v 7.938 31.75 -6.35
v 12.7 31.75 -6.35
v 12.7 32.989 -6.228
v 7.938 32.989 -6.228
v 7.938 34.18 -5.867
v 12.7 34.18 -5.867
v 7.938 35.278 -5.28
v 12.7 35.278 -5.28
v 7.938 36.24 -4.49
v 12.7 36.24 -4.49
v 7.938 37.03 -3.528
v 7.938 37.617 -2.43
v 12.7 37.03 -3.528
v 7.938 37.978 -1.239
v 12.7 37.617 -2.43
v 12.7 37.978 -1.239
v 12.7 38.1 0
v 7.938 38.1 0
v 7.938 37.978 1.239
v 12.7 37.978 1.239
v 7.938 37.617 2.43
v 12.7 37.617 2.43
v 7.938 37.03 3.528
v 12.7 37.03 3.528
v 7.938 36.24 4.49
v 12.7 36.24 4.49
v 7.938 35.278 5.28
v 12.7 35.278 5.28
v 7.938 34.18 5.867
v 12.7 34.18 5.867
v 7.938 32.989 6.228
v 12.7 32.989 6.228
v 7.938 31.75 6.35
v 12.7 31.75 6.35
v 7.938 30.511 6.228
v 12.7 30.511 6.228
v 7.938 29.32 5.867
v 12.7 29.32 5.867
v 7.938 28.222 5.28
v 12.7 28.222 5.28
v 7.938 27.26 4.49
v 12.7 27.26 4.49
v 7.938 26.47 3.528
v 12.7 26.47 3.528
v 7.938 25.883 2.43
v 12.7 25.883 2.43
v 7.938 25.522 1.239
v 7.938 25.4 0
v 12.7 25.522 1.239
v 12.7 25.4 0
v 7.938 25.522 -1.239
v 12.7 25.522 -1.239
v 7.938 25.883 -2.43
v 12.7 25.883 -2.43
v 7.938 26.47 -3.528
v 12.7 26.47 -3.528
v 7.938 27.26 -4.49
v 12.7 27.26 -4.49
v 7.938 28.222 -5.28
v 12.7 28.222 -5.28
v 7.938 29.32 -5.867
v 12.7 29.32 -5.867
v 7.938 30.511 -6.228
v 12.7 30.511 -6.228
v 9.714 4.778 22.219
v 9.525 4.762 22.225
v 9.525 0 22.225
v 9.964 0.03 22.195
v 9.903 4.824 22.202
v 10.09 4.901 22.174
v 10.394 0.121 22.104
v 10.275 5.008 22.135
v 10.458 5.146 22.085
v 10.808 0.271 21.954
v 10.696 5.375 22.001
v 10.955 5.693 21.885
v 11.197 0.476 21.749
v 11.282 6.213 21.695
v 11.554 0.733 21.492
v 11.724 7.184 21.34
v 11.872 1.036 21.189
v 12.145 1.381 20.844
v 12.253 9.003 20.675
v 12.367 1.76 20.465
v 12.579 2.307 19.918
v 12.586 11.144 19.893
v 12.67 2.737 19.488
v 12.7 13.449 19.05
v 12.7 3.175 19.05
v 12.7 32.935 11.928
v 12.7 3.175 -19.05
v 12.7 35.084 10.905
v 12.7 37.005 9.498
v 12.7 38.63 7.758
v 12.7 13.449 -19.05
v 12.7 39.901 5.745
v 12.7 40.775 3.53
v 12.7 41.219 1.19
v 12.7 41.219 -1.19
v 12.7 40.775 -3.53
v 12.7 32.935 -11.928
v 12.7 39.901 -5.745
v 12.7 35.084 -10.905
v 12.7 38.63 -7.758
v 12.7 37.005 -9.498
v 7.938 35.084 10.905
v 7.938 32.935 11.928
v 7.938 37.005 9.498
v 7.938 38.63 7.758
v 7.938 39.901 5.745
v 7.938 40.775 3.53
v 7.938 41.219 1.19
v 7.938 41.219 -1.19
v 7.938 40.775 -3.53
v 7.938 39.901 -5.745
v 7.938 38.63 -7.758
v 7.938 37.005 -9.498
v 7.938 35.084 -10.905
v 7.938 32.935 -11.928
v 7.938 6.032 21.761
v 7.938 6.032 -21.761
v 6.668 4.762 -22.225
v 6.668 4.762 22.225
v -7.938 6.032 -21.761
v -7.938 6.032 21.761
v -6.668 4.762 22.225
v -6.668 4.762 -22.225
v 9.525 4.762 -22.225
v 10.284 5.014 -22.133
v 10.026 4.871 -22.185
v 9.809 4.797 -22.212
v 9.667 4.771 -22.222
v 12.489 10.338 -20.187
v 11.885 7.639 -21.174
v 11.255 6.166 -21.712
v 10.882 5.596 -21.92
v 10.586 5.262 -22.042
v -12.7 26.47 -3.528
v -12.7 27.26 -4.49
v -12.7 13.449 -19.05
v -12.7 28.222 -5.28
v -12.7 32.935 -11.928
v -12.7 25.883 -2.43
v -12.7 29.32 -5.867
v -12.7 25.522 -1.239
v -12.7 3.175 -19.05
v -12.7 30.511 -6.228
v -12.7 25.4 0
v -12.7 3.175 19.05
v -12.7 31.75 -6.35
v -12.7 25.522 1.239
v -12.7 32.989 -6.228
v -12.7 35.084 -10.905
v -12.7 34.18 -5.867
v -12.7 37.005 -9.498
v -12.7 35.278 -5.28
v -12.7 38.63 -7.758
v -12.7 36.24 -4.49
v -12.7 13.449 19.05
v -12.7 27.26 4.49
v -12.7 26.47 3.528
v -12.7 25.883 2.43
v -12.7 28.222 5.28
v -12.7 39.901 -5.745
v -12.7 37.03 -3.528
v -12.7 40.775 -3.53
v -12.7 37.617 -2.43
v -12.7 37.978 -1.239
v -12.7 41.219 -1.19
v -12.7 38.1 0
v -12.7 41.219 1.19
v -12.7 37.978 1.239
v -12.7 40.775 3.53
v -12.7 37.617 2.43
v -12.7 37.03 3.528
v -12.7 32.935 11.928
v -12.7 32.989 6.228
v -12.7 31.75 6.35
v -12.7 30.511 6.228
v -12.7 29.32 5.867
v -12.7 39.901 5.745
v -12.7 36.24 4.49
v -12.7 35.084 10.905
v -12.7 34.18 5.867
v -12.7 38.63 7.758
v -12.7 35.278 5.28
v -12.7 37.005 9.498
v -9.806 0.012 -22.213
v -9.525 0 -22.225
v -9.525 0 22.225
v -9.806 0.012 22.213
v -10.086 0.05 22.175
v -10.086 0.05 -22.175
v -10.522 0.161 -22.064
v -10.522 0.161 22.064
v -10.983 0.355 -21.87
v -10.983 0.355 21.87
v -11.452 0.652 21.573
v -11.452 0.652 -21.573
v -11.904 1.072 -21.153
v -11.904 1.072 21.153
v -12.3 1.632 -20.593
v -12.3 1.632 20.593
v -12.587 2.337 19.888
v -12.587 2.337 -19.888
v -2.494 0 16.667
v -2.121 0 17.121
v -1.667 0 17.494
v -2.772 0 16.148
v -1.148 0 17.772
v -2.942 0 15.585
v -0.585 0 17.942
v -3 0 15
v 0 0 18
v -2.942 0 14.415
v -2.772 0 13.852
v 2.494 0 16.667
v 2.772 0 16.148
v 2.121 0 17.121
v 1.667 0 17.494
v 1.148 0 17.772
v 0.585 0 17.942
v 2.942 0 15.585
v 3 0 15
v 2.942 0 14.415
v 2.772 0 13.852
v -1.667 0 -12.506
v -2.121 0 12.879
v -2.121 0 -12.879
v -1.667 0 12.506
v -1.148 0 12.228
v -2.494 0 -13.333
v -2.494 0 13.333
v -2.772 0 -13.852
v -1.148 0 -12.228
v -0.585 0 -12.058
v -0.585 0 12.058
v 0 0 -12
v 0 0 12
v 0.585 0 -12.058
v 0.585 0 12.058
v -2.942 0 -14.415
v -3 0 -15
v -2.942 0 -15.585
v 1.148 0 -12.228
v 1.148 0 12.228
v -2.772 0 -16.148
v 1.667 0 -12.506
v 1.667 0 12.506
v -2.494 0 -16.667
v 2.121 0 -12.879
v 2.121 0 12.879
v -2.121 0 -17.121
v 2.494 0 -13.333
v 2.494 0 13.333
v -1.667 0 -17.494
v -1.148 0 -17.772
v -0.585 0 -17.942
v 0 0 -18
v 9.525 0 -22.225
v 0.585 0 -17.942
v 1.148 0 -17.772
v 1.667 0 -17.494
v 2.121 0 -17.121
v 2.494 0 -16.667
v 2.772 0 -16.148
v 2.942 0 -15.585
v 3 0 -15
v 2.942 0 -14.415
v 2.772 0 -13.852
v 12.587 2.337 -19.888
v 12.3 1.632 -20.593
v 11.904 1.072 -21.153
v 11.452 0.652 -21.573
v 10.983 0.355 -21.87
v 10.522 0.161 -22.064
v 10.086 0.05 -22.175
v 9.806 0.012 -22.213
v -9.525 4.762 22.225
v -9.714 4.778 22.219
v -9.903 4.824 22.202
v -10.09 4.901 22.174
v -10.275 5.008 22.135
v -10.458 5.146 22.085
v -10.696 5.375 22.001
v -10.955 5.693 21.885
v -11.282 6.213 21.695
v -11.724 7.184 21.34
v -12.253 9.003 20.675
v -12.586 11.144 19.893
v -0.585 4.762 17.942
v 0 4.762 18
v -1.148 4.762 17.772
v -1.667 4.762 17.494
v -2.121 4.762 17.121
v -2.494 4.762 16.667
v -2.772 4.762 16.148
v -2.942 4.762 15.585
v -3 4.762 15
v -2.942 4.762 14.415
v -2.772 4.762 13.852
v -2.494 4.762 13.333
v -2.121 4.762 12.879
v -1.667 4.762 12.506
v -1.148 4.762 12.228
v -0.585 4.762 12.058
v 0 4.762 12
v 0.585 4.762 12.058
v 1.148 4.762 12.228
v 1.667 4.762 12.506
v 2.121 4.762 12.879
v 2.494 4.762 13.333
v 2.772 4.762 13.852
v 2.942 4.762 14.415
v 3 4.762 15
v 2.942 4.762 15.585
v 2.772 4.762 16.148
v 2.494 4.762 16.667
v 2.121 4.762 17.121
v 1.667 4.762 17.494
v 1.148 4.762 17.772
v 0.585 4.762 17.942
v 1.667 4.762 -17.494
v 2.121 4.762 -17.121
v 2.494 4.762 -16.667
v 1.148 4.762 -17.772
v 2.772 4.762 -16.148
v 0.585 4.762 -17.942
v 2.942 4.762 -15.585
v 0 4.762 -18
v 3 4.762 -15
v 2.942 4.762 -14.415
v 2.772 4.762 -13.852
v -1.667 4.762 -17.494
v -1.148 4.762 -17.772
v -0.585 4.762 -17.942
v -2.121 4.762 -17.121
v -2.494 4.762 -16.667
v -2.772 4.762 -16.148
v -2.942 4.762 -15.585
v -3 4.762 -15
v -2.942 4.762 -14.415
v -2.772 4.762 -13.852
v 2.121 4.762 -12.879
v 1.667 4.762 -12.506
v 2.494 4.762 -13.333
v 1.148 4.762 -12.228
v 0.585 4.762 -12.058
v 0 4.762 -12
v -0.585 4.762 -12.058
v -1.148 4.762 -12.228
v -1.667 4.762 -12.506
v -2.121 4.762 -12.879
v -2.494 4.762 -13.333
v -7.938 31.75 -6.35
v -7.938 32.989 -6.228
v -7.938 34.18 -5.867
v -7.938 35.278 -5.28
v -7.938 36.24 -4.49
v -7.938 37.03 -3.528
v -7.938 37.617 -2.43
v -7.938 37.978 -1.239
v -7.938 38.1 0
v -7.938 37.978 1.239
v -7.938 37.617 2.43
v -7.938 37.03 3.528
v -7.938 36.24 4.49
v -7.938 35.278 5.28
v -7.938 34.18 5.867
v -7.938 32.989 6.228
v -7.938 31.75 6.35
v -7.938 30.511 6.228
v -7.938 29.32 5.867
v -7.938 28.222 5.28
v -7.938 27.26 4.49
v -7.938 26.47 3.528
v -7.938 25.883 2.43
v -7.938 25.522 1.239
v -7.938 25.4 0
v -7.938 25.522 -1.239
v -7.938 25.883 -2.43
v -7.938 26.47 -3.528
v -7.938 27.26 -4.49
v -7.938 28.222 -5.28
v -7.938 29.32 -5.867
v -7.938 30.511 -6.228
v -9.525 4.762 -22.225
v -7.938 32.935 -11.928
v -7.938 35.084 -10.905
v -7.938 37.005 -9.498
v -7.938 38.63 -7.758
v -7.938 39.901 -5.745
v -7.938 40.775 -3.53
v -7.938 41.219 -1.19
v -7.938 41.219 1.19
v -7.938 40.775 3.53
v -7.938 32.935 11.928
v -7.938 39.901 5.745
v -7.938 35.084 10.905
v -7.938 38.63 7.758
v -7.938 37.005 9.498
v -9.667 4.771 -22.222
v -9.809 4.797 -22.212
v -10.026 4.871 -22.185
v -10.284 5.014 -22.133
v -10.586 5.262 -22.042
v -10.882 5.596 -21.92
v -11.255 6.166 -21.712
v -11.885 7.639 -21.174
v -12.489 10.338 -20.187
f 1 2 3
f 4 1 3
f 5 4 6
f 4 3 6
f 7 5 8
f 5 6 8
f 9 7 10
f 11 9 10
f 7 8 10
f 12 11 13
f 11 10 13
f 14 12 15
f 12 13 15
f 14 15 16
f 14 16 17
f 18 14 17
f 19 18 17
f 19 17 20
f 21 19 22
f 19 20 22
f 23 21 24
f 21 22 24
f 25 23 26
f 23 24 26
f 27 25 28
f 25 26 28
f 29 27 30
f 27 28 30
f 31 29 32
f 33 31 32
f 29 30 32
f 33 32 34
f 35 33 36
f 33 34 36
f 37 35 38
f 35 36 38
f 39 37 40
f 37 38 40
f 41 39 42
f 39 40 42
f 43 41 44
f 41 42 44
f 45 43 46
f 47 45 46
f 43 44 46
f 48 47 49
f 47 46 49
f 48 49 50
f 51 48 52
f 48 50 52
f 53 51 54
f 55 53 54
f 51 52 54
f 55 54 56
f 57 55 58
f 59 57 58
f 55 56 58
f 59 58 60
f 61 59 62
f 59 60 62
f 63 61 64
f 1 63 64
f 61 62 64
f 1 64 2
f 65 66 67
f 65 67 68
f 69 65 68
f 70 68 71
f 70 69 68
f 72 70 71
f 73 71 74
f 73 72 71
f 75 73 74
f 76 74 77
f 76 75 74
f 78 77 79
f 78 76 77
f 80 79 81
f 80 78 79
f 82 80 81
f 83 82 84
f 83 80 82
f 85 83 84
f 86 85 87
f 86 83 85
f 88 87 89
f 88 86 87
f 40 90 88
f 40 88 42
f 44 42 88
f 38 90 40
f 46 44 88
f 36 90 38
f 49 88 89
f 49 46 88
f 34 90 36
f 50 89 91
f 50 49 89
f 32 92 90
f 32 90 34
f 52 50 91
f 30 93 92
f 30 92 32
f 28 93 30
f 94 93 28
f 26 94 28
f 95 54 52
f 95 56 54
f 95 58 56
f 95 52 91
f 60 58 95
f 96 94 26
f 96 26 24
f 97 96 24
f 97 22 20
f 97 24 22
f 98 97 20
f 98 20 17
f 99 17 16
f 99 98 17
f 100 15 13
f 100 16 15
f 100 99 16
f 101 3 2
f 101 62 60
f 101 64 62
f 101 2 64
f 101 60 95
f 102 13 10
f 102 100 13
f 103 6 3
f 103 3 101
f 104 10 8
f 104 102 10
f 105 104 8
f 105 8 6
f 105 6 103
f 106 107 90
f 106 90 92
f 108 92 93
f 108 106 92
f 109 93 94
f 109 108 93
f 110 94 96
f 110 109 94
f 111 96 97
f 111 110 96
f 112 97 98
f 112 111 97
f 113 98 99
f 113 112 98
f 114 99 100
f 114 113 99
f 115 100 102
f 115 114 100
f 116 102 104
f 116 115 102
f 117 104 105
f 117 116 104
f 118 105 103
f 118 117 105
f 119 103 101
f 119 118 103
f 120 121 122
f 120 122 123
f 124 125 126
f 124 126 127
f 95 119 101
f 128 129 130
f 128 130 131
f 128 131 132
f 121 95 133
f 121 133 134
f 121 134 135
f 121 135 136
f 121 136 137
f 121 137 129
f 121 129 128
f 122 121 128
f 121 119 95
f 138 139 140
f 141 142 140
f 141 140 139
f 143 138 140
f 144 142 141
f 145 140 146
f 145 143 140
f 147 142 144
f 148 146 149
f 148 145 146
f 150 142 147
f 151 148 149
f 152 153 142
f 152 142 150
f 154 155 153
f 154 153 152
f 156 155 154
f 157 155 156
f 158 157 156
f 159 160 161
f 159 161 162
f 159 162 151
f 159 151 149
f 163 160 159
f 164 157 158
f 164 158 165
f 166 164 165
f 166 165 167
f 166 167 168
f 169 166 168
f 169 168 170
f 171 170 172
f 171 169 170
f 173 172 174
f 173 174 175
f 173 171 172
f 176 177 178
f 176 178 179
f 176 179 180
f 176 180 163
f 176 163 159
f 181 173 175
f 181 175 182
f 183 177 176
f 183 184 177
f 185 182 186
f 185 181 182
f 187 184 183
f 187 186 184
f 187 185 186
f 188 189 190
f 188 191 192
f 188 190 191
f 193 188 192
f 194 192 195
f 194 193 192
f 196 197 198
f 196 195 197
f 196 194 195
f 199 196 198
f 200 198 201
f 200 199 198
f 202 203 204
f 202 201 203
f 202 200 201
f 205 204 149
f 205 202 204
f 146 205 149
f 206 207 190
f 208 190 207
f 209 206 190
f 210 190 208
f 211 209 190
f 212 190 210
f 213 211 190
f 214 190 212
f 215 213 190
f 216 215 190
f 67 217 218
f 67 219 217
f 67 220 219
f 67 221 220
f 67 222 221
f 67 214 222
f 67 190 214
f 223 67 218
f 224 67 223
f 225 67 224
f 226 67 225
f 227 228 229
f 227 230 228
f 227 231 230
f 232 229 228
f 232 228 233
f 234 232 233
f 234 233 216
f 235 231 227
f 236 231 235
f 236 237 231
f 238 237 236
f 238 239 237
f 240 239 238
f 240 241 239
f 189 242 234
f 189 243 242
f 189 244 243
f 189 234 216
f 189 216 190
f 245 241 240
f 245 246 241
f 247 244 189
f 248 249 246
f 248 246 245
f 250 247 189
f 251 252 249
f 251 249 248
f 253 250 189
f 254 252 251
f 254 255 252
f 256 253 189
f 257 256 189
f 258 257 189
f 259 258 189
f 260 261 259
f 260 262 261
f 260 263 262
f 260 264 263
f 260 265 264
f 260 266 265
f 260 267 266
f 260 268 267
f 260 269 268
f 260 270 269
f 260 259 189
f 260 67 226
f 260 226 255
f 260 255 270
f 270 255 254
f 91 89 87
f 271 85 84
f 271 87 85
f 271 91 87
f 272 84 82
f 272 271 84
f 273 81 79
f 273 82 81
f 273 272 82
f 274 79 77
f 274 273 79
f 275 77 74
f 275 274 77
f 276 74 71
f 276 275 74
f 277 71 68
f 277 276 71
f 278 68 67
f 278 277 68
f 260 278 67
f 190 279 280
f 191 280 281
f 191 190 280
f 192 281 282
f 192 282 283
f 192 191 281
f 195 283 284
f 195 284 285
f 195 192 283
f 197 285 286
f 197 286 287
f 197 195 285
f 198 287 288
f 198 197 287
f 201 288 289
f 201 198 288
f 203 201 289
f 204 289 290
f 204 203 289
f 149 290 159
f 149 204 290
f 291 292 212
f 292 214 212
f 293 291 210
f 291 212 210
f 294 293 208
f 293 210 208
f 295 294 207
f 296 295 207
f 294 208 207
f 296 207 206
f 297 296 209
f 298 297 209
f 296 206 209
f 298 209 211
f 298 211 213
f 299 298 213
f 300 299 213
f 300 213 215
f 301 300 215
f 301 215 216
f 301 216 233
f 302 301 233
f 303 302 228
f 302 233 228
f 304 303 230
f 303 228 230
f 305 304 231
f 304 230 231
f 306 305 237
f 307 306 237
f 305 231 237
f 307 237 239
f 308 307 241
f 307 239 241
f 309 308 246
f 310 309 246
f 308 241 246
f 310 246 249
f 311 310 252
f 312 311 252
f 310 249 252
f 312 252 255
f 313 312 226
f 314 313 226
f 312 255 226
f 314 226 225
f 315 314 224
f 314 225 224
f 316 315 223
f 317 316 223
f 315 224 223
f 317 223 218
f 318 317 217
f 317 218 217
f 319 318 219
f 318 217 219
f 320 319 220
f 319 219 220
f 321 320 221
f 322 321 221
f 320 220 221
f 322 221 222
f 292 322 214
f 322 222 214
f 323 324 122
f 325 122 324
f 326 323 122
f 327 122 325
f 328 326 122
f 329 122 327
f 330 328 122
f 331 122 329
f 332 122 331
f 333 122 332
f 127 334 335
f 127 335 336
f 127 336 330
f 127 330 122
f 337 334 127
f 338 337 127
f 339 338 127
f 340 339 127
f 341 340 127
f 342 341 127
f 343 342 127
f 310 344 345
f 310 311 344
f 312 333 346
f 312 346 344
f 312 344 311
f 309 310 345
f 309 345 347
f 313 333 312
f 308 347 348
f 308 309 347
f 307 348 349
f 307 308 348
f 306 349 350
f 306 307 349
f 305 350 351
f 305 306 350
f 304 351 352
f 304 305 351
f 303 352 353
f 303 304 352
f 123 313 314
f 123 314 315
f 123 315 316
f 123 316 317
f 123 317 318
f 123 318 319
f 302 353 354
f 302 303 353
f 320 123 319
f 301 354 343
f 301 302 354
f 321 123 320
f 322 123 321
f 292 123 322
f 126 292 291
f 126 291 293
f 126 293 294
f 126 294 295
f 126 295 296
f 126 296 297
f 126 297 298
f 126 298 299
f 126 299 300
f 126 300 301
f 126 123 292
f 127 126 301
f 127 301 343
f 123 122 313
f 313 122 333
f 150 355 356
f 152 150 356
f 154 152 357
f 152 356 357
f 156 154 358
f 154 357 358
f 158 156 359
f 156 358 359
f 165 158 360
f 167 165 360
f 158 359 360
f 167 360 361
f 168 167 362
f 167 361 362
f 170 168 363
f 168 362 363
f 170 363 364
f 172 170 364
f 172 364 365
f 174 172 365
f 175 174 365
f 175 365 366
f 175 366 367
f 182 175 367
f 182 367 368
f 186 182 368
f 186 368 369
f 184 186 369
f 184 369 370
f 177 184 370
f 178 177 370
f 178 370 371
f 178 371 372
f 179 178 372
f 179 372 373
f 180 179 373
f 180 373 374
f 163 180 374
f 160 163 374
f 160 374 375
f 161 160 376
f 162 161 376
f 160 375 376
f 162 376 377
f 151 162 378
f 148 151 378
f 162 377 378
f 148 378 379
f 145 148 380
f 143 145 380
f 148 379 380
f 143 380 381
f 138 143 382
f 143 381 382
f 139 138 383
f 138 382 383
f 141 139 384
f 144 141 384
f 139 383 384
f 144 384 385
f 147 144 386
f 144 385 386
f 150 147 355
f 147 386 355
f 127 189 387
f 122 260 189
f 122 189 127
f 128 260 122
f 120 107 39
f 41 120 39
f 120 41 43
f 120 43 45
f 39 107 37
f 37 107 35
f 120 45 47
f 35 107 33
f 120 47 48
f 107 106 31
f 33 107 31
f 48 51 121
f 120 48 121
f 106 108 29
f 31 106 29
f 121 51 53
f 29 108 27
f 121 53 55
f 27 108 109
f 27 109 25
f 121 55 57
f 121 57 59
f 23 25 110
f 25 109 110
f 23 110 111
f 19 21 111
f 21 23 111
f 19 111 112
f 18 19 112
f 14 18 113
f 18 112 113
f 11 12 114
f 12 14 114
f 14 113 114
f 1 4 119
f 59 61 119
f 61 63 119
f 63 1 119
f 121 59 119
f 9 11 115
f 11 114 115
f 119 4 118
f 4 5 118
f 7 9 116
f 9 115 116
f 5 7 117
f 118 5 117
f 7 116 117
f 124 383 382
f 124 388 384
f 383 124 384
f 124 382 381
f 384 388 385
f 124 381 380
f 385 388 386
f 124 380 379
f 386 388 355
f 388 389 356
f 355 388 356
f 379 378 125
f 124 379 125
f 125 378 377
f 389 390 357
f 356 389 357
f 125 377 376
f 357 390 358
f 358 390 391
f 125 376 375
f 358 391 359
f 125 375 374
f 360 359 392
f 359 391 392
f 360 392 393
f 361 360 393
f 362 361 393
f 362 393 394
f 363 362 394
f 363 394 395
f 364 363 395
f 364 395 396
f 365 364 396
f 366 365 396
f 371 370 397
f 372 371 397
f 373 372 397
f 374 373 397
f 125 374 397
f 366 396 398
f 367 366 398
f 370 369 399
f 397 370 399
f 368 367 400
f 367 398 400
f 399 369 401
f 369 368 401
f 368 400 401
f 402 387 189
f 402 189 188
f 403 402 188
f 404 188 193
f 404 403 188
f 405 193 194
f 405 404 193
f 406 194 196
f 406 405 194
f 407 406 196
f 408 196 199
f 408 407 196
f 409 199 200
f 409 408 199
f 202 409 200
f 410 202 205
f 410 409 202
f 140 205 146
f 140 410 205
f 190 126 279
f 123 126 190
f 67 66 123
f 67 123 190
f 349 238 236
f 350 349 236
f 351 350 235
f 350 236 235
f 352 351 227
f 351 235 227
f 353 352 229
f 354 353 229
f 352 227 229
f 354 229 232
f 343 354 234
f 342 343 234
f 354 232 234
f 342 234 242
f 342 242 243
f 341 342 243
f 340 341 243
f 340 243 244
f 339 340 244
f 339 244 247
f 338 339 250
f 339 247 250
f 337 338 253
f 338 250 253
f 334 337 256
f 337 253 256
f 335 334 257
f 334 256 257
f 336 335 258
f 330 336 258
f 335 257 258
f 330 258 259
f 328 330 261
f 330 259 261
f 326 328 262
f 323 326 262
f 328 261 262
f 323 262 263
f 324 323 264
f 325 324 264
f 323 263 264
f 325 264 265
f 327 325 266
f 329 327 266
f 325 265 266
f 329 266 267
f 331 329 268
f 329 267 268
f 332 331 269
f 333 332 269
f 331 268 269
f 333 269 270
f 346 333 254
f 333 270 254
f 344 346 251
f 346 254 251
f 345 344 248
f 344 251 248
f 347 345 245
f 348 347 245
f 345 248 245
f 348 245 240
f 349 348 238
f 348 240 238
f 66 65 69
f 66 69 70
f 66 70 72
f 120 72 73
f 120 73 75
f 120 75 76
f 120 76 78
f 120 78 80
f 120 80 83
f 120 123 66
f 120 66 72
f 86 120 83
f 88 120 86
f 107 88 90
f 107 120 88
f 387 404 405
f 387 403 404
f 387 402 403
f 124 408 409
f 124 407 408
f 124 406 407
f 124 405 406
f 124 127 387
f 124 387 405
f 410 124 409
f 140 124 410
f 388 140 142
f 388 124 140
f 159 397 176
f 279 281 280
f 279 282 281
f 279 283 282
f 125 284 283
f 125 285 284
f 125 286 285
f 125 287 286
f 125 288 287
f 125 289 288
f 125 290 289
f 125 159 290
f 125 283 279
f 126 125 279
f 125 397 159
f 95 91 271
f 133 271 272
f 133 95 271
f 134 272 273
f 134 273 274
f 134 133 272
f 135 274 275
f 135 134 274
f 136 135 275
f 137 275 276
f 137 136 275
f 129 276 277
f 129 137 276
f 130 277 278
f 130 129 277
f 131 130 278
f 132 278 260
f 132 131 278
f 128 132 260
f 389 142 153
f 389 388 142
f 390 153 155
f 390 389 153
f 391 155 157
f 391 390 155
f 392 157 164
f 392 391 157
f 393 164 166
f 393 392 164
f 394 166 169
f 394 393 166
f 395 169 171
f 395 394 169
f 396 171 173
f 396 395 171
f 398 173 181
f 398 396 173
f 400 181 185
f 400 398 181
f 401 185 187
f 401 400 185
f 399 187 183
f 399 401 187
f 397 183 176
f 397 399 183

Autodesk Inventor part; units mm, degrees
sketch "Sketch1" plane through (0, 0, 0) normal (0, 1, 0) x (-1, 0, 0)
  line L0 (7.9375, 22.225) -> (-7.9375, 22.225)
  line L1 (-7.9375, 22.225) -> (-7.9375, -22.225)
  line L2 (-7.9375, -22.225) -> (7.9375, -22.225)
  line L3 (7.9375, -22.225) -> (7.9375, 22.225)
  line L4 (7.9375, 22.225) -> (-7.9375, -22.225) construction
  line L5 (-7.9375, 22.225) -> (7.9375, -22.225) construction
  point P0 (0, 0)
  point P1 (-50.8, 0)
  dimension "d0" = 15.875
  dimension "d1" = 44.45
extrude "Base" add sketch "Sketch1" along normal blind 4.7625
sketch "Sketch2" plane through (7.9375, 0, 22.225) normal (1, 0, 0) x (0, 0, -1)
  line L0 (0, 0) -> (0, 4.7625) projected
  line L1 (0, 4.7625) -> (10.2968, 32.9347)
  line L2 (0, 4.7625) -> (44.45, 4.7625) projected
  line L3 (34.1532, 32.9347) -> (44.45, 4.7625)
  line L4 (0, 0) -> (44.45, 0) projected
  arc A0 (34.1532, 32.9347) -> (10.2968, 32.9347) centre (22.225, 28.575) ccw
  line L5 (0, 0) -> (44.45, 0) projected
  line L6 (44.45, 0) -> (44.45, 4.7625) projected
  line L7 (0, 4.7625) -> (44.45, 4.7625) projected
  line L8 (0, 0) -> (0, 4.7625) projected
  point P0 (22.225, 0)
  point P1 (22.225, 41.275)
  dimension "d10" = 12.7
  dimension "d12" = 41.275
extrude "Vertical 1" add sketch "Sketch2" along normal blind 4.7625
sketch "Sketch5" plane through (-7.9375, 0, -22.225) normal (-1, 0, 0) x (0, 0, 1)
  line L0 (44.45, 4.7625) -> (44.45, 0) projected
  line L1 (44.45, 0) -> (0, 0) projected
  line L2 (0, 0) -> (0, 4.7625) projected
  line L3 (0, 4.7625) -> (10.2968, 32.9347) projected
  arc A0 (34.1532, 32.9347) -> (10.2968, 32.9347) centre (22.225, 28.575) ccw projected
  line L4 (34.1532, 32.9347) -> (44.45, 4.7625) projected
extrude "Vertical 2" add sketch "Sketch5" along normal blind 4.7625
sketch "Sketch6" plane through (12.7, 0, 22.225) normal (1, 0, 0) x (0, 0, -1)
  line L0 (22.225, 0) -> (22.225, 41.275) construction
  arc A0 (34.1532, 32.9347) -> (10.2968, 32.9347) centre (22.225, 28.575) ccw projected
  circle A1 centre (22.225, 31.75) radius 6.35
  dimension "d29" = 12.7
  dimension "d30" = 9.525
extrude "Extrusion8" cut sketch "Sketch6" against normal through all
fillet "Fillet2" radius 3.175 6 edges at (-12.7, 0, 0) (-12.7, 2.3813, -22.225) (12.7, 2.3813, -22.225) (12.7, 2.3813, 22.225) (12.7, 0, 0) (-12.7, 2.3813, 22.225)
chamfer "Chamfer2" distance 1.27 angle 45 2 edges at (-7.9375, 4.7625, 0) (7.9375, 4.7625, 0)
ref_plane "Work Plane2" through (0, 31.75, 0) normal (0, 1, 0) x (-1, 0, 0)
sketch "Sketch7" plane through (0, 4.7625, 0) normal (0, 1, 0) x (1, 0, 0)
  line L0 (0, 31.115) -> (0, -31.115) construction
  line L1 (17.78, 0) -> (-17.78, 0) construction
  point P0 (0, 0)
  point P1 (0, -15)
  point P2 (0, 15)
  dimension "d37" = 30
hole "Hole1" at (0, 4.7625, 15) at (0, 4.7625, -15) direction (0, -1, 0) diameter 6 end through all
ref_plane "Work Plane1" through (0, 0, 22.225) normal (-1, 0, 0) x (0, 0, 1)
equation "\"d43\" = Thickness"
equation "\"BendRadius\" = Thickness"
equation "\"BendReliefWidth\" = Thickness"
equation "\"BendReliefDepth\" = 0.5 * Thickness"
equation "\"CornerReliefSize\" = 4 * Thickness"
equation "\"MinimumRemnant\" = 2 * Thickness"
equation "\"TransitionRadius\" = BendRadius"
equation "\"JacobiRadiusSize\" = BendRadius"
equation "\"GapSize\" = Thickness"
equation "\"Thickness\" = 3.048"
properties part number "0.5 in Rod End Bracket (Rough)"
